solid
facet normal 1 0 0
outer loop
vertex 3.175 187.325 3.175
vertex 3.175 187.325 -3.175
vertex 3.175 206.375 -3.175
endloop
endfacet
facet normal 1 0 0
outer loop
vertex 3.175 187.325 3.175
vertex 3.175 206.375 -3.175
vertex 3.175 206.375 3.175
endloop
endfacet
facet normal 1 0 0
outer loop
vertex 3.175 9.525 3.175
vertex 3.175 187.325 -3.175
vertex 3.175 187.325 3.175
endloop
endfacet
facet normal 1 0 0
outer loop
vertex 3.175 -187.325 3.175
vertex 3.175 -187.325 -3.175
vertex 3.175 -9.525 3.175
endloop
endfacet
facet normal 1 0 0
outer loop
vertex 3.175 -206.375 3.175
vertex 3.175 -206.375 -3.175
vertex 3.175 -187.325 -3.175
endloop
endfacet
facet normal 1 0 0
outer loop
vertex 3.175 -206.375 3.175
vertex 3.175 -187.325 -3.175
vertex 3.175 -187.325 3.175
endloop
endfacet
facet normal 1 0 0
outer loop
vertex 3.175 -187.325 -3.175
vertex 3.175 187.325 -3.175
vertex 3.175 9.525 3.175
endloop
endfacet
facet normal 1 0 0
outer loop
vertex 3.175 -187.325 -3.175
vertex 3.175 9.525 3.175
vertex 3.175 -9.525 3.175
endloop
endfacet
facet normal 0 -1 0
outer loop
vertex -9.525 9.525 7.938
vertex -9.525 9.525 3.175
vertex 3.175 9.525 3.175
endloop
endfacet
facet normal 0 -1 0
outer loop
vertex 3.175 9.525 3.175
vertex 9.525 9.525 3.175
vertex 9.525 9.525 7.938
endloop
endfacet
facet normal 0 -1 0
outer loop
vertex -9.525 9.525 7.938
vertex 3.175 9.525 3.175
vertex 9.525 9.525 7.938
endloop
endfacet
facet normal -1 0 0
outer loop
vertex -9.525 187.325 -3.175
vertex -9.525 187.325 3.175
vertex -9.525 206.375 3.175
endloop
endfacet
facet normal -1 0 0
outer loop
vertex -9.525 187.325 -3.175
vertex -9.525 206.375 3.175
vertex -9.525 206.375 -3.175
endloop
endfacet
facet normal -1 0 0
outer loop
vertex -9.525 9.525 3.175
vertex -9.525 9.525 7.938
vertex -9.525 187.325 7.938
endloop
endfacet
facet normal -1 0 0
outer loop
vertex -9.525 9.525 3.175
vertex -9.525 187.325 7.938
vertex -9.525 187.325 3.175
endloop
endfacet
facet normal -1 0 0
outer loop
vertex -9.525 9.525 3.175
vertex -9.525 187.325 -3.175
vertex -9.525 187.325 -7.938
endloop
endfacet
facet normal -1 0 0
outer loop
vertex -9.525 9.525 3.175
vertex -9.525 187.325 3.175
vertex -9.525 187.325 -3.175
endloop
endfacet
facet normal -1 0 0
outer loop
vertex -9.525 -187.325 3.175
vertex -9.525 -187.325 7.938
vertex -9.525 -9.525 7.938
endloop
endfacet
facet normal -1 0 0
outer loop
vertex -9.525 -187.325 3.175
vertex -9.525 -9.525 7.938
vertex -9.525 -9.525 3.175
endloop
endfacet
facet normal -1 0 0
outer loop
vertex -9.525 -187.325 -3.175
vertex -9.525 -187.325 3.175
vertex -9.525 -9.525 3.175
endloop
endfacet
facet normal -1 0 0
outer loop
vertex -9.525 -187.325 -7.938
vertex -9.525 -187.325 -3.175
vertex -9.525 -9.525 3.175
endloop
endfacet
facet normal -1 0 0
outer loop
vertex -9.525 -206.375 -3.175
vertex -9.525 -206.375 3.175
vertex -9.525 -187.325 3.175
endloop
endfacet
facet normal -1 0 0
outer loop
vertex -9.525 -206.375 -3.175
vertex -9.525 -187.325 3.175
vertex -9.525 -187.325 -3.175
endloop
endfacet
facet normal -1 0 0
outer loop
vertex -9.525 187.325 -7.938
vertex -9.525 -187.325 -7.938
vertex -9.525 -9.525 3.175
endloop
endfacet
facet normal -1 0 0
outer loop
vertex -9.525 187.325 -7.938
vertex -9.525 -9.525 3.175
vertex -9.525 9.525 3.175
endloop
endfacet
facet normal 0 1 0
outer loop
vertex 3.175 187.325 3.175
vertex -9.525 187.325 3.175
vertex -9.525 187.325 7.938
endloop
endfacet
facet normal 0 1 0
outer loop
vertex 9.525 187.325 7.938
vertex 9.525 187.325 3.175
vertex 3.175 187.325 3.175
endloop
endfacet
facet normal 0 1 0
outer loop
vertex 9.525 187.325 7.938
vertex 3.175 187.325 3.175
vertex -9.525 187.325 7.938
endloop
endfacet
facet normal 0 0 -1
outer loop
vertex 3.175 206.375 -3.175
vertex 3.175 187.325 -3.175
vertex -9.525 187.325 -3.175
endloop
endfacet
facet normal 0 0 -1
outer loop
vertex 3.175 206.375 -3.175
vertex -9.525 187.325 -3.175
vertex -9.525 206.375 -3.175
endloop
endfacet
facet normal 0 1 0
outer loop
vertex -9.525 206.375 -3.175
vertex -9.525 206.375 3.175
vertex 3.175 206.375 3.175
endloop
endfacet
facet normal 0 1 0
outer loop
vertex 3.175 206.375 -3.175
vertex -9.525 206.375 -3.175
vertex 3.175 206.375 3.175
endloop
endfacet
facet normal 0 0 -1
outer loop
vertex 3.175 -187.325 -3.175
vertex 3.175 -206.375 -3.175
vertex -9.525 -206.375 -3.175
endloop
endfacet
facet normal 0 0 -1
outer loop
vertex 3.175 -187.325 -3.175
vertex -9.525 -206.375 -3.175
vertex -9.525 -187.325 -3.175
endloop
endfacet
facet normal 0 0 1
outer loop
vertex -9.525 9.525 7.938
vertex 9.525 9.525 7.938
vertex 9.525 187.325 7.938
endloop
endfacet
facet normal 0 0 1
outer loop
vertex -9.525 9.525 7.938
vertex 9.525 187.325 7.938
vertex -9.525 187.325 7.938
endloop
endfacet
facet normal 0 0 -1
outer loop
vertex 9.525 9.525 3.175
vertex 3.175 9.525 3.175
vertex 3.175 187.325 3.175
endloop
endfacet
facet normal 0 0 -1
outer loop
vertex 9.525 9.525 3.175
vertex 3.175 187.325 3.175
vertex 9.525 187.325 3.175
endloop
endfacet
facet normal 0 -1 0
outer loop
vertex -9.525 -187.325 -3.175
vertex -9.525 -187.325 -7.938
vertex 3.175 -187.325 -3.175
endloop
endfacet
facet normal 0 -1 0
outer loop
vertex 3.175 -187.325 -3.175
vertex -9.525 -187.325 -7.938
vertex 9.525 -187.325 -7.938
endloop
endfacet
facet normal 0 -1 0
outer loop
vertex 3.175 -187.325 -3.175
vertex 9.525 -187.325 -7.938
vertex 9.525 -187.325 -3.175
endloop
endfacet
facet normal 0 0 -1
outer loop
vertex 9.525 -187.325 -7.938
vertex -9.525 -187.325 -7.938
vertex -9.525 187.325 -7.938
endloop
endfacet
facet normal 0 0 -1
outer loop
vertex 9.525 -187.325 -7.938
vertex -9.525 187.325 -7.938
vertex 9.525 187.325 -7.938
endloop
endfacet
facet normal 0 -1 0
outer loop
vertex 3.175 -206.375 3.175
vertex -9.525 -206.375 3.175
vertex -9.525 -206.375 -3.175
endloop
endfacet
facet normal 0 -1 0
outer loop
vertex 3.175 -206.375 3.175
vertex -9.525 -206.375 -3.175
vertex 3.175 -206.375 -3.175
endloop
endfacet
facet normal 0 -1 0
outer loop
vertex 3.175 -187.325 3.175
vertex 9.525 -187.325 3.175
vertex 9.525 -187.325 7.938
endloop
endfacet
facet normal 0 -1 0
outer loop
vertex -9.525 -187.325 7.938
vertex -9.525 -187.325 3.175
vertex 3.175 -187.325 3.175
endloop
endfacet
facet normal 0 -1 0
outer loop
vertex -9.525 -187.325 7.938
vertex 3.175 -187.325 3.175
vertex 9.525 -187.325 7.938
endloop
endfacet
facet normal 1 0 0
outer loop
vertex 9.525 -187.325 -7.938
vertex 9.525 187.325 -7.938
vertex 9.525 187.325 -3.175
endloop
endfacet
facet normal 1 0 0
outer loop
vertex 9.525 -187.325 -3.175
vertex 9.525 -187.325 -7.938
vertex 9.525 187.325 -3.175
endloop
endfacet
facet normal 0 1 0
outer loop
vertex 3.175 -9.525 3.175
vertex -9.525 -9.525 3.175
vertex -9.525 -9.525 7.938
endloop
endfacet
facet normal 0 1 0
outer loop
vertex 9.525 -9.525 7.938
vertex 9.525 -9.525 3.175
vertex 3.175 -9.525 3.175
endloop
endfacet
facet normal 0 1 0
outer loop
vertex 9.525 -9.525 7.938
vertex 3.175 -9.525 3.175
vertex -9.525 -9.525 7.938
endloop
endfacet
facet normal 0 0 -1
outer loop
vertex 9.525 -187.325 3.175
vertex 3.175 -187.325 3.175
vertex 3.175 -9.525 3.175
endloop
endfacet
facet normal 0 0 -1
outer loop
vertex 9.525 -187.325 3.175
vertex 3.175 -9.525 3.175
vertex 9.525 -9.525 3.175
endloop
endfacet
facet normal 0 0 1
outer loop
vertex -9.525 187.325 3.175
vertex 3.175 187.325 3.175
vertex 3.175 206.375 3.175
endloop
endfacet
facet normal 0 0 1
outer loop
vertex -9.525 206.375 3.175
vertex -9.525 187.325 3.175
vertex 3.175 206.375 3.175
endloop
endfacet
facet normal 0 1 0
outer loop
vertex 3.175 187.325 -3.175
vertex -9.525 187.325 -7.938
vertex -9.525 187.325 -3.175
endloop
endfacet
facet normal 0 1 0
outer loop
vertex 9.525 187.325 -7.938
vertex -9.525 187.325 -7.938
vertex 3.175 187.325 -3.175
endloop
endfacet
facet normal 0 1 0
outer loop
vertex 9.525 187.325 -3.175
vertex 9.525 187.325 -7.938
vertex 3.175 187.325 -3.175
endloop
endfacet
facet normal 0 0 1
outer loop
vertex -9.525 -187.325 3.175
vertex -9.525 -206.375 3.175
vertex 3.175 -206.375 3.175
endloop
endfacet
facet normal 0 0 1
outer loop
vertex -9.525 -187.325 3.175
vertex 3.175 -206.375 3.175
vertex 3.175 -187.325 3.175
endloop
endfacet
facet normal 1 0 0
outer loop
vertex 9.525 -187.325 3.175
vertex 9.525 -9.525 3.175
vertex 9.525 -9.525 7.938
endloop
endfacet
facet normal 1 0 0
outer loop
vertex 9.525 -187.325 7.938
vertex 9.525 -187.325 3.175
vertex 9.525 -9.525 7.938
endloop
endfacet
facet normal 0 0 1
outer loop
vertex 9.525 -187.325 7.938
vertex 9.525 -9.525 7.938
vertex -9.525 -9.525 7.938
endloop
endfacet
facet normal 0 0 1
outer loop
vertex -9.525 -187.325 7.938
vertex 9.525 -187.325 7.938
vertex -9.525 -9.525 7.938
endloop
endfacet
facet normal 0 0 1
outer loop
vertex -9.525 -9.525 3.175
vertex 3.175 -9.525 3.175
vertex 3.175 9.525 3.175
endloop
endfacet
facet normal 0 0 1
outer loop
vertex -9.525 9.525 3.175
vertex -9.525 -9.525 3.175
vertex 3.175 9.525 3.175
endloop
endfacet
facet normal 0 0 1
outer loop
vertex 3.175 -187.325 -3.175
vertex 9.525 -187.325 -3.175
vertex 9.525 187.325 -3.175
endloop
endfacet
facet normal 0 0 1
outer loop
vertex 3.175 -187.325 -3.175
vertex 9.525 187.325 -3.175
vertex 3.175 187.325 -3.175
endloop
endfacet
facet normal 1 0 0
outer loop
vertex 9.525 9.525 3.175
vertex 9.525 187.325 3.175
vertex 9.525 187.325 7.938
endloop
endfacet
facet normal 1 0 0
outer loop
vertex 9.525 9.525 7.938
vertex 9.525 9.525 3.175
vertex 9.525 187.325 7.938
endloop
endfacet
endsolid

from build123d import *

# Parameters (mm, degrees)
F1_DEPTH      = 206.375
F2_W          = 19.05
F2_H          = 4.7625
F3_DEPTH      = 9.526
F3_DEPTH_BACK = 9.526


with BuildPart() as f1:
    # F0 (on Front) → F1 (new body, symmetric)
    with BuildSketch(Plane.XZ):
        Polygon((9.525, 7.9375), (-9.525, 7.9375), (-9.525, -7.9375), (9.525, -7.9375), (9.525, -3.175), (3.175, -3.175), (3.175, 3.175), (9.525, 3.175), align=None)
    extrude(amount=F1_DEPTH, both=True)

    # F2 (on Right) → F3 (cut, two sides)
    with BuildSketch(Plane.YZ) as f3_sk:
        with Locations((-196.85, 5.55625)):
            Rectangle(F2_W, F2_H)
        with Locations((-196.85, -5.55625)):
            Rectangle(F2_W, F2_H)
        with Locations((196.85, 5.55625)):
            Rectangle(F2_W, F2_H)
        with Locations((196.85, -5.55625)):
            Rectangle(F2_W, F2_H)
        with Locations((0, 5.55625)):
            Rectangle(F2_W, F2_H)
    extrude(amount=-F3_DEPTH, mode=Mode.SUBTRACT)
    extrude(f3_sk.sketch, amount=F3_DEPTH_BACK, mode=Mode.SUBTRACT)


solid = f1.part
